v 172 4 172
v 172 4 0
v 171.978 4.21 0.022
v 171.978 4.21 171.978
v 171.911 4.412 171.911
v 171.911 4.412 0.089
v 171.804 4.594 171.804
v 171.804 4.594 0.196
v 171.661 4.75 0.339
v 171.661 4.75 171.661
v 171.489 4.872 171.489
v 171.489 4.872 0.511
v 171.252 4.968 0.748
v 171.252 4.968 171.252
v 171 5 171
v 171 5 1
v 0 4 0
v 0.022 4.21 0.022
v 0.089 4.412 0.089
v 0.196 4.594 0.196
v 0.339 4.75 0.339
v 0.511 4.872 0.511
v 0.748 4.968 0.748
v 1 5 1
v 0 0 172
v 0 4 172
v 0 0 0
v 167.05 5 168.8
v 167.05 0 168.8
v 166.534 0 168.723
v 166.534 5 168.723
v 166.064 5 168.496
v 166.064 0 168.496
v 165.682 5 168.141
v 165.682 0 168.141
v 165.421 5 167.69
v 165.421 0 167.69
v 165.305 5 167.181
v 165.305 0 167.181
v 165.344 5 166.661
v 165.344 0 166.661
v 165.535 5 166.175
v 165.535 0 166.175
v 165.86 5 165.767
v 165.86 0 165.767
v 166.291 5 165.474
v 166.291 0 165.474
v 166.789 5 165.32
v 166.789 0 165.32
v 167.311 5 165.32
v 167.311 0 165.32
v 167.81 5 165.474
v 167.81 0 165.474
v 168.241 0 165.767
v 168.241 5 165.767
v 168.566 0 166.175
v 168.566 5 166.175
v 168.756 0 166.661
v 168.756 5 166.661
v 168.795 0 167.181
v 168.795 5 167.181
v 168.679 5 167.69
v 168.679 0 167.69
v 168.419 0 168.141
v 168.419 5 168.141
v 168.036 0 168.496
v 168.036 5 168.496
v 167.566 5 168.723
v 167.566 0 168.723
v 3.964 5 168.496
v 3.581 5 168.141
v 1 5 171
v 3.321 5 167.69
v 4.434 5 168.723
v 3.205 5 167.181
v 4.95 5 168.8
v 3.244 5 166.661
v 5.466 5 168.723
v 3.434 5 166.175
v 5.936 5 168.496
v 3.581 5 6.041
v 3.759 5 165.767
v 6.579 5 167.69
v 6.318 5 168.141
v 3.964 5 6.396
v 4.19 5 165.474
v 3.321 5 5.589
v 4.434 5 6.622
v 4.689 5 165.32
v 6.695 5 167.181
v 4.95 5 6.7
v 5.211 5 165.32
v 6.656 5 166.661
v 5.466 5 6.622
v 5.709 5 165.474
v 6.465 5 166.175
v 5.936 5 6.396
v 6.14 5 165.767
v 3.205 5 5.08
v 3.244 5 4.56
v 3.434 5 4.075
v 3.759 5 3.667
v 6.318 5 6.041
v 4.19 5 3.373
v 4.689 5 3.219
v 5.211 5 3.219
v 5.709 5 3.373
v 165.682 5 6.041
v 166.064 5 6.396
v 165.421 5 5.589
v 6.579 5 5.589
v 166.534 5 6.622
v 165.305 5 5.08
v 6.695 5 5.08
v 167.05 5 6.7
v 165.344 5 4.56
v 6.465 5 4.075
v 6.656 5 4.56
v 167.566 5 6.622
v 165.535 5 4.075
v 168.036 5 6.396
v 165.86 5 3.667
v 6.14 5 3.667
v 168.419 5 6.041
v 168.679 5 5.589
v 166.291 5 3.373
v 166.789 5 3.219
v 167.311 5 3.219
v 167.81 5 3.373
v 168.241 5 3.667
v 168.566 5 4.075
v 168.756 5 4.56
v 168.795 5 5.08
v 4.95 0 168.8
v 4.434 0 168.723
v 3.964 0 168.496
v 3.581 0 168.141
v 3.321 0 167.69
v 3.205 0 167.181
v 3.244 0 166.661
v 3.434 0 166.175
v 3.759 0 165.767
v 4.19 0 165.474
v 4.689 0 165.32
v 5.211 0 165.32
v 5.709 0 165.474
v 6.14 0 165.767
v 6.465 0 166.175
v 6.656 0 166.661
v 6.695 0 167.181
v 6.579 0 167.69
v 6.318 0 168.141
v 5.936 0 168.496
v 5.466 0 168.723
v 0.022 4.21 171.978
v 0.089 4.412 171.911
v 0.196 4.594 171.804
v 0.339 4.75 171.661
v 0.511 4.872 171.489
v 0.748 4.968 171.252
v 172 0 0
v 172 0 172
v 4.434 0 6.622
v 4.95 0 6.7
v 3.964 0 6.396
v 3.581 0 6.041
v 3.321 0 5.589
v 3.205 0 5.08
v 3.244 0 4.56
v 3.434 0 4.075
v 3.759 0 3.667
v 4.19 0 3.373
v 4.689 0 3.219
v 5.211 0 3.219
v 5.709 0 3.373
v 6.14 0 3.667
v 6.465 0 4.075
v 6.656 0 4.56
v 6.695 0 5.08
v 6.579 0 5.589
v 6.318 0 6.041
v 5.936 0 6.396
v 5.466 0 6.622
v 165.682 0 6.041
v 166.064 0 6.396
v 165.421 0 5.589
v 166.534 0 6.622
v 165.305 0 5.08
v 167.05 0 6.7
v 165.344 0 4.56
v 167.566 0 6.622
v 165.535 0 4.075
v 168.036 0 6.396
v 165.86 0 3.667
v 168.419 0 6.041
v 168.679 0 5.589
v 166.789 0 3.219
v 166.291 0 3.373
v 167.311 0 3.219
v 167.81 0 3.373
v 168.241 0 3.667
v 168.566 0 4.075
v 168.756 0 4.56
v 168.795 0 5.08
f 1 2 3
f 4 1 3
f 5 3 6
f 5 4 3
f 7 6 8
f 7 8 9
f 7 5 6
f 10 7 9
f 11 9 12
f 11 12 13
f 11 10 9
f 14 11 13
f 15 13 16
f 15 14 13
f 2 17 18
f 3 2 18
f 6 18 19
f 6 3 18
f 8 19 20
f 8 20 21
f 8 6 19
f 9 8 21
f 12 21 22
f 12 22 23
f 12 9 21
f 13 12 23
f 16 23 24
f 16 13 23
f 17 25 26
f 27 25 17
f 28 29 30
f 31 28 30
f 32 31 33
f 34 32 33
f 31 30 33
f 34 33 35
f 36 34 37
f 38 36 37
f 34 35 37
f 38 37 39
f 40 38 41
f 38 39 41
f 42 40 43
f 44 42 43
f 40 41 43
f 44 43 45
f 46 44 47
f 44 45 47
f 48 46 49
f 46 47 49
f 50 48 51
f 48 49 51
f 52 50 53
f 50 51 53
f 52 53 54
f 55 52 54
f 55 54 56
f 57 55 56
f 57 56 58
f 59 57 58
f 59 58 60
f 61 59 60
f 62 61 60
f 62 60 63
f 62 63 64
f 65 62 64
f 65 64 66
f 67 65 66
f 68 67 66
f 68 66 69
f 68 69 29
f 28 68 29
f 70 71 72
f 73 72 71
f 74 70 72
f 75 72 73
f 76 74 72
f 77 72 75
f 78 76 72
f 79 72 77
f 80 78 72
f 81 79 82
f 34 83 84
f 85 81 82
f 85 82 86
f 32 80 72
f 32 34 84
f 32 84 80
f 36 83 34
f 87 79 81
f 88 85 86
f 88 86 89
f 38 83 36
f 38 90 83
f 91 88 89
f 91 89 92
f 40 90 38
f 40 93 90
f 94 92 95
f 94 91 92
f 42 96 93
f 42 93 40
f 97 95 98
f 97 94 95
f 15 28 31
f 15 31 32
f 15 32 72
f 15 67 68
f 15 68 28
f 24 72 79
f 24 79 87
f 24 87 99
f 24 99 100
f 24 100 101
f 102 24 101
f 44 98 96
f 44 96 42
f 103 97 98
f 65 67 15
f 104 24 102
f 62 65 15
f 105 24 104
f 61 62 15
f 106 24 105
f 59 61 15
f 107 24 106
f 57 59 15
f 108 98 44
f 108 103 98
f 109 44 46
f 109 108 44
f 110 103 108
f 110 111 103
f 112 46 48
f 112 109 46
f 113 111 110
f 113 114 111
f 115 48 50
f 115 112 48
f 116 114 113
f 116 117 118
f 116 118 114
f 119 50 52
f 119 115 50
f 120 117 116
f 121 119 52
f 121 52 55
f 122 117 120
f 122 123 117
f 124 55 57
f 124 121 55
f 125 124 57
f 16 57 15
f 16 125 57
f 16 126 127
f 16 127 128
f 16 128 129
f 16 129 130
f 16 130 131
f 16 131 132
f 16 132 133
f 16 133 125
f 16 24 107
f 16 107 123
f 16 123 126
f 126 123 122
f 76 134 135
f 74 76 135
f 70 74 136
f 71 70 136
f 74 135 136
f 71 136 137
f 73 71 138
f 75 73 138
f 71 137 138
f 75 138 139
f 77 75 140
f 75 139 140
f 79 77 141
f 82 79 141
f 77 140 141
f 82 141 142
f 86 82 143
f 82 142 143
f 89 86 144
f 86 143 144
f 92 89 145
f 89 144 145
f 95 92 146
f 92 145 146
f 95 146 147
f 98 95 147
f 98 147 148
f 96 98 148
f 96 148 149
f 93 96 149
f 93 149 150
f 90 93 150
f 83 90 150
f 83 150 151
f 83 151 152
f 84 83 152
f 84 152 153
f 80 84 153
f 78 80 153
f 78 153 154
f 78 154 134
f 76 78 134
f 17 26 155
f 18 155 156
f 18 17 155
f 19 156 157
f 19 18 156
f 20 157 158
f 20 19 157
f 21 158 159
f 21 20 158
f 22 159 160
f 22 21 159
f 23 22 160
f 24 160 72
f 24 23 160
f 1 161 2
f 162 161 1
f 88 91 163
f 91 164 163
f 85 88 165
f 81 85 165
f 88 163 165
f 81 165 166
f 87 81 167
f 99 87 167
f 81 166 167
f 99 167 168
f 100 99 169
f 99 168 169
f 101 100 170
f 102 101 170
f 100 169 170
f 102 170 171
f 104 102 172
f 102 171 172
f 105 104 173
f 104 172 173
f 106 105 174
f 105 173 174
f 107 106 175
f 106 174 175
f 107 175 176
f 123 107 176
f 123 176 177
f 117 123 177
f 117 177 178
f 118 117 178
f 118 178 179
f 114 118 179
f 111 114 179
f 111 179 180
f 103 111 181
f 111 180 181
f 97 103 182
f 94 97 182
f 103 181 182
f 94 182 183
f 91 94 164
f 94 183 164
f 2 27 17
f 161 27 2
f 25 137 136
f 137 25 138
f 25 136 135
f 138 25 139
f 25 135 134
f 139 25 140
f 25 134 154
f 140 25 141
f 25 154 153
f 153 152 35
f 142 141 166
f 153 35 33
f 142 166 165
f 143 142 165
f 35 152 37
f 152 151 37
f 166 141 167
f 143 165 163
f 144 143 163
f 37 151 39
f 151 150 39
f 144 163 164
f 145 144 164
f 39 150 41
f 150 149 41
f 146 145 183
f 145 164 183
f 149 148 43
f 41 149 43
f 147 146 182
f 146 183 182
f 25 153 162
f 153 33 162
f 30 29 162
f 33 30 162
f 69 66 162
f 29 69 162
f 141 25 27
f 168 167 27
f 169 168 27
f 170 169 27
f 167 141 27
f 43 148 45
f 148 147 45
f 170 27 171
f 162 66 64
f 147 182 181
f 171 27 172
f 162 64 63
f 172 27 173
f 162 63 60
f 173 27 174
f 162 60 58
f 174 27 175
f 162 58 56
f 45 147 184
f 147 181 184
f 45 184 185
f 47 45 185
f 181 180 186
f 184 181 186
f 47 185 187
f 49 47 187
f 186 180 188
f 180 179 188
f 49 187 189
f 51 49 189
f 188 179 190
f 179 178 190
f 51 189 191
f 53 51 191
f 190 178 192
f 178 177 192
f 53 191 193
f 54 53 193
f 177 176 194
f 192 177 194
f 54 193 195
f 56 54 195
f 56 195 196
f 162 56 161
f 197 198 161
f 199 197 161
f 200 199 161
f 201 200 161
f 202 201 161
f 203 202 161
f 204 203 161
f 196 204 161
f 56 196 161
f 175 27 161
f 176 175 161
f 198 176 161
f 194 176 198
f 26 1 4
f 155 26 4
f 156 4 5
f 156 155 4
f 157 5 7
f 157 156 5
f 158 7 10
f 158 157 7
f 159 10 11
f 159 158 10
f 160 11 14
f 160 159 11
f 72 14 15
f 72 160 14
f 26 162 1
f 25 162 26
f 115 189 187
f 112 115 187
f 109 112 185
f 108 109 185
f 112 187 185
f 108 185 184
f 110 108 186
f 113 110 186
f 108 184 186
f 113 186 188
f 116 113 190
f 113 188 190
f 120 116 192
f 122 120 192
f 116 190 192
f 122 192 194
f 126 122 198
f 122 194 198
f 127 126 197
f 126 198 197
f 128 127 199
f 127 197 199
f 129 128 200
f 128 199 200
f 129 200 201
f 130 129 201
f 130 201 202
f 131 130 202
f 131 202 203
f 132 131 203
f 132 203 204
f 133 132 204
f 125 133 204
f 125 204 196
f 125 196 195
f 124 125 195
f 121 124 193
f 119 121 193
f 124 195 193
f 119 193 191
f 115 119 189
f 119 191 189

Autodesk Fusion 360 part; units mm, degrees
sketch "Sketch1" plane through (0, 0, 0) normal (0, 1, 0) x (1, 0, 0)
  line L0 (0, 0) -> (172, 0)
  line L1 (172, 0) -> (172, -172)
  line L2 (172, -172) -> (0, -172)
  line L3 (0, -172) -> (0, 0)
  dimension "d1" = 172
  dimension "d2" = 172
extrude "Extrude1" add sketch "Sketch1" along normal blind 5
sketch "Sketch2" plane through (0, 5, 0) normal (0, 1, 0) x (-1, 0, 0)
  line L0 (0, 172) -> (-172, 172)
  line L1 (-172, 172) -> (-172, 0)
  line L2 (-172, 0) -> (0, 0)
  line L3 (0, 0) -> (0, 172)
  line L4 (0, 0) -> (-4.9497, 4.9497)
  line L5 (0, 0) -> (-7, 0) construction
  line L6 (-172, 172) -> (-167.0503, 167.0503)
  line L7 (-172, 172) -> (-165, 172) construction
  line L8 (-4.9497, 4.9497) -> (-167.0503, 4.9497)
  line L9 (-167.0503, 4.9497) -> (-167.0503, 167.0503)
  line L10 (-167.0503, 167.0503) -> (-4.9497, 167.0503)
  line L11 (-4.9497, 167.0503) -> (-4.9497, 4.9497)
  dimension "d5" = 45
  dimension "d6" = 7
  dimension "d7" = 45
  dimension "d8" = 7
hole "Hole1" at (4.9497, 5, 4.9497) at (167.0503, 5, 4.9497) at (167.0503, 5, 167.0503) at (4.9497, 5, 167.0503) direction (0, -1, 0) diameter 3.5 depth 9 tip angle 180
fillet "Fillet1" radius 1 4 edges at (0, 5, 86) (86, 5, 0) (172, 5, 86) (86, 5, 172)
